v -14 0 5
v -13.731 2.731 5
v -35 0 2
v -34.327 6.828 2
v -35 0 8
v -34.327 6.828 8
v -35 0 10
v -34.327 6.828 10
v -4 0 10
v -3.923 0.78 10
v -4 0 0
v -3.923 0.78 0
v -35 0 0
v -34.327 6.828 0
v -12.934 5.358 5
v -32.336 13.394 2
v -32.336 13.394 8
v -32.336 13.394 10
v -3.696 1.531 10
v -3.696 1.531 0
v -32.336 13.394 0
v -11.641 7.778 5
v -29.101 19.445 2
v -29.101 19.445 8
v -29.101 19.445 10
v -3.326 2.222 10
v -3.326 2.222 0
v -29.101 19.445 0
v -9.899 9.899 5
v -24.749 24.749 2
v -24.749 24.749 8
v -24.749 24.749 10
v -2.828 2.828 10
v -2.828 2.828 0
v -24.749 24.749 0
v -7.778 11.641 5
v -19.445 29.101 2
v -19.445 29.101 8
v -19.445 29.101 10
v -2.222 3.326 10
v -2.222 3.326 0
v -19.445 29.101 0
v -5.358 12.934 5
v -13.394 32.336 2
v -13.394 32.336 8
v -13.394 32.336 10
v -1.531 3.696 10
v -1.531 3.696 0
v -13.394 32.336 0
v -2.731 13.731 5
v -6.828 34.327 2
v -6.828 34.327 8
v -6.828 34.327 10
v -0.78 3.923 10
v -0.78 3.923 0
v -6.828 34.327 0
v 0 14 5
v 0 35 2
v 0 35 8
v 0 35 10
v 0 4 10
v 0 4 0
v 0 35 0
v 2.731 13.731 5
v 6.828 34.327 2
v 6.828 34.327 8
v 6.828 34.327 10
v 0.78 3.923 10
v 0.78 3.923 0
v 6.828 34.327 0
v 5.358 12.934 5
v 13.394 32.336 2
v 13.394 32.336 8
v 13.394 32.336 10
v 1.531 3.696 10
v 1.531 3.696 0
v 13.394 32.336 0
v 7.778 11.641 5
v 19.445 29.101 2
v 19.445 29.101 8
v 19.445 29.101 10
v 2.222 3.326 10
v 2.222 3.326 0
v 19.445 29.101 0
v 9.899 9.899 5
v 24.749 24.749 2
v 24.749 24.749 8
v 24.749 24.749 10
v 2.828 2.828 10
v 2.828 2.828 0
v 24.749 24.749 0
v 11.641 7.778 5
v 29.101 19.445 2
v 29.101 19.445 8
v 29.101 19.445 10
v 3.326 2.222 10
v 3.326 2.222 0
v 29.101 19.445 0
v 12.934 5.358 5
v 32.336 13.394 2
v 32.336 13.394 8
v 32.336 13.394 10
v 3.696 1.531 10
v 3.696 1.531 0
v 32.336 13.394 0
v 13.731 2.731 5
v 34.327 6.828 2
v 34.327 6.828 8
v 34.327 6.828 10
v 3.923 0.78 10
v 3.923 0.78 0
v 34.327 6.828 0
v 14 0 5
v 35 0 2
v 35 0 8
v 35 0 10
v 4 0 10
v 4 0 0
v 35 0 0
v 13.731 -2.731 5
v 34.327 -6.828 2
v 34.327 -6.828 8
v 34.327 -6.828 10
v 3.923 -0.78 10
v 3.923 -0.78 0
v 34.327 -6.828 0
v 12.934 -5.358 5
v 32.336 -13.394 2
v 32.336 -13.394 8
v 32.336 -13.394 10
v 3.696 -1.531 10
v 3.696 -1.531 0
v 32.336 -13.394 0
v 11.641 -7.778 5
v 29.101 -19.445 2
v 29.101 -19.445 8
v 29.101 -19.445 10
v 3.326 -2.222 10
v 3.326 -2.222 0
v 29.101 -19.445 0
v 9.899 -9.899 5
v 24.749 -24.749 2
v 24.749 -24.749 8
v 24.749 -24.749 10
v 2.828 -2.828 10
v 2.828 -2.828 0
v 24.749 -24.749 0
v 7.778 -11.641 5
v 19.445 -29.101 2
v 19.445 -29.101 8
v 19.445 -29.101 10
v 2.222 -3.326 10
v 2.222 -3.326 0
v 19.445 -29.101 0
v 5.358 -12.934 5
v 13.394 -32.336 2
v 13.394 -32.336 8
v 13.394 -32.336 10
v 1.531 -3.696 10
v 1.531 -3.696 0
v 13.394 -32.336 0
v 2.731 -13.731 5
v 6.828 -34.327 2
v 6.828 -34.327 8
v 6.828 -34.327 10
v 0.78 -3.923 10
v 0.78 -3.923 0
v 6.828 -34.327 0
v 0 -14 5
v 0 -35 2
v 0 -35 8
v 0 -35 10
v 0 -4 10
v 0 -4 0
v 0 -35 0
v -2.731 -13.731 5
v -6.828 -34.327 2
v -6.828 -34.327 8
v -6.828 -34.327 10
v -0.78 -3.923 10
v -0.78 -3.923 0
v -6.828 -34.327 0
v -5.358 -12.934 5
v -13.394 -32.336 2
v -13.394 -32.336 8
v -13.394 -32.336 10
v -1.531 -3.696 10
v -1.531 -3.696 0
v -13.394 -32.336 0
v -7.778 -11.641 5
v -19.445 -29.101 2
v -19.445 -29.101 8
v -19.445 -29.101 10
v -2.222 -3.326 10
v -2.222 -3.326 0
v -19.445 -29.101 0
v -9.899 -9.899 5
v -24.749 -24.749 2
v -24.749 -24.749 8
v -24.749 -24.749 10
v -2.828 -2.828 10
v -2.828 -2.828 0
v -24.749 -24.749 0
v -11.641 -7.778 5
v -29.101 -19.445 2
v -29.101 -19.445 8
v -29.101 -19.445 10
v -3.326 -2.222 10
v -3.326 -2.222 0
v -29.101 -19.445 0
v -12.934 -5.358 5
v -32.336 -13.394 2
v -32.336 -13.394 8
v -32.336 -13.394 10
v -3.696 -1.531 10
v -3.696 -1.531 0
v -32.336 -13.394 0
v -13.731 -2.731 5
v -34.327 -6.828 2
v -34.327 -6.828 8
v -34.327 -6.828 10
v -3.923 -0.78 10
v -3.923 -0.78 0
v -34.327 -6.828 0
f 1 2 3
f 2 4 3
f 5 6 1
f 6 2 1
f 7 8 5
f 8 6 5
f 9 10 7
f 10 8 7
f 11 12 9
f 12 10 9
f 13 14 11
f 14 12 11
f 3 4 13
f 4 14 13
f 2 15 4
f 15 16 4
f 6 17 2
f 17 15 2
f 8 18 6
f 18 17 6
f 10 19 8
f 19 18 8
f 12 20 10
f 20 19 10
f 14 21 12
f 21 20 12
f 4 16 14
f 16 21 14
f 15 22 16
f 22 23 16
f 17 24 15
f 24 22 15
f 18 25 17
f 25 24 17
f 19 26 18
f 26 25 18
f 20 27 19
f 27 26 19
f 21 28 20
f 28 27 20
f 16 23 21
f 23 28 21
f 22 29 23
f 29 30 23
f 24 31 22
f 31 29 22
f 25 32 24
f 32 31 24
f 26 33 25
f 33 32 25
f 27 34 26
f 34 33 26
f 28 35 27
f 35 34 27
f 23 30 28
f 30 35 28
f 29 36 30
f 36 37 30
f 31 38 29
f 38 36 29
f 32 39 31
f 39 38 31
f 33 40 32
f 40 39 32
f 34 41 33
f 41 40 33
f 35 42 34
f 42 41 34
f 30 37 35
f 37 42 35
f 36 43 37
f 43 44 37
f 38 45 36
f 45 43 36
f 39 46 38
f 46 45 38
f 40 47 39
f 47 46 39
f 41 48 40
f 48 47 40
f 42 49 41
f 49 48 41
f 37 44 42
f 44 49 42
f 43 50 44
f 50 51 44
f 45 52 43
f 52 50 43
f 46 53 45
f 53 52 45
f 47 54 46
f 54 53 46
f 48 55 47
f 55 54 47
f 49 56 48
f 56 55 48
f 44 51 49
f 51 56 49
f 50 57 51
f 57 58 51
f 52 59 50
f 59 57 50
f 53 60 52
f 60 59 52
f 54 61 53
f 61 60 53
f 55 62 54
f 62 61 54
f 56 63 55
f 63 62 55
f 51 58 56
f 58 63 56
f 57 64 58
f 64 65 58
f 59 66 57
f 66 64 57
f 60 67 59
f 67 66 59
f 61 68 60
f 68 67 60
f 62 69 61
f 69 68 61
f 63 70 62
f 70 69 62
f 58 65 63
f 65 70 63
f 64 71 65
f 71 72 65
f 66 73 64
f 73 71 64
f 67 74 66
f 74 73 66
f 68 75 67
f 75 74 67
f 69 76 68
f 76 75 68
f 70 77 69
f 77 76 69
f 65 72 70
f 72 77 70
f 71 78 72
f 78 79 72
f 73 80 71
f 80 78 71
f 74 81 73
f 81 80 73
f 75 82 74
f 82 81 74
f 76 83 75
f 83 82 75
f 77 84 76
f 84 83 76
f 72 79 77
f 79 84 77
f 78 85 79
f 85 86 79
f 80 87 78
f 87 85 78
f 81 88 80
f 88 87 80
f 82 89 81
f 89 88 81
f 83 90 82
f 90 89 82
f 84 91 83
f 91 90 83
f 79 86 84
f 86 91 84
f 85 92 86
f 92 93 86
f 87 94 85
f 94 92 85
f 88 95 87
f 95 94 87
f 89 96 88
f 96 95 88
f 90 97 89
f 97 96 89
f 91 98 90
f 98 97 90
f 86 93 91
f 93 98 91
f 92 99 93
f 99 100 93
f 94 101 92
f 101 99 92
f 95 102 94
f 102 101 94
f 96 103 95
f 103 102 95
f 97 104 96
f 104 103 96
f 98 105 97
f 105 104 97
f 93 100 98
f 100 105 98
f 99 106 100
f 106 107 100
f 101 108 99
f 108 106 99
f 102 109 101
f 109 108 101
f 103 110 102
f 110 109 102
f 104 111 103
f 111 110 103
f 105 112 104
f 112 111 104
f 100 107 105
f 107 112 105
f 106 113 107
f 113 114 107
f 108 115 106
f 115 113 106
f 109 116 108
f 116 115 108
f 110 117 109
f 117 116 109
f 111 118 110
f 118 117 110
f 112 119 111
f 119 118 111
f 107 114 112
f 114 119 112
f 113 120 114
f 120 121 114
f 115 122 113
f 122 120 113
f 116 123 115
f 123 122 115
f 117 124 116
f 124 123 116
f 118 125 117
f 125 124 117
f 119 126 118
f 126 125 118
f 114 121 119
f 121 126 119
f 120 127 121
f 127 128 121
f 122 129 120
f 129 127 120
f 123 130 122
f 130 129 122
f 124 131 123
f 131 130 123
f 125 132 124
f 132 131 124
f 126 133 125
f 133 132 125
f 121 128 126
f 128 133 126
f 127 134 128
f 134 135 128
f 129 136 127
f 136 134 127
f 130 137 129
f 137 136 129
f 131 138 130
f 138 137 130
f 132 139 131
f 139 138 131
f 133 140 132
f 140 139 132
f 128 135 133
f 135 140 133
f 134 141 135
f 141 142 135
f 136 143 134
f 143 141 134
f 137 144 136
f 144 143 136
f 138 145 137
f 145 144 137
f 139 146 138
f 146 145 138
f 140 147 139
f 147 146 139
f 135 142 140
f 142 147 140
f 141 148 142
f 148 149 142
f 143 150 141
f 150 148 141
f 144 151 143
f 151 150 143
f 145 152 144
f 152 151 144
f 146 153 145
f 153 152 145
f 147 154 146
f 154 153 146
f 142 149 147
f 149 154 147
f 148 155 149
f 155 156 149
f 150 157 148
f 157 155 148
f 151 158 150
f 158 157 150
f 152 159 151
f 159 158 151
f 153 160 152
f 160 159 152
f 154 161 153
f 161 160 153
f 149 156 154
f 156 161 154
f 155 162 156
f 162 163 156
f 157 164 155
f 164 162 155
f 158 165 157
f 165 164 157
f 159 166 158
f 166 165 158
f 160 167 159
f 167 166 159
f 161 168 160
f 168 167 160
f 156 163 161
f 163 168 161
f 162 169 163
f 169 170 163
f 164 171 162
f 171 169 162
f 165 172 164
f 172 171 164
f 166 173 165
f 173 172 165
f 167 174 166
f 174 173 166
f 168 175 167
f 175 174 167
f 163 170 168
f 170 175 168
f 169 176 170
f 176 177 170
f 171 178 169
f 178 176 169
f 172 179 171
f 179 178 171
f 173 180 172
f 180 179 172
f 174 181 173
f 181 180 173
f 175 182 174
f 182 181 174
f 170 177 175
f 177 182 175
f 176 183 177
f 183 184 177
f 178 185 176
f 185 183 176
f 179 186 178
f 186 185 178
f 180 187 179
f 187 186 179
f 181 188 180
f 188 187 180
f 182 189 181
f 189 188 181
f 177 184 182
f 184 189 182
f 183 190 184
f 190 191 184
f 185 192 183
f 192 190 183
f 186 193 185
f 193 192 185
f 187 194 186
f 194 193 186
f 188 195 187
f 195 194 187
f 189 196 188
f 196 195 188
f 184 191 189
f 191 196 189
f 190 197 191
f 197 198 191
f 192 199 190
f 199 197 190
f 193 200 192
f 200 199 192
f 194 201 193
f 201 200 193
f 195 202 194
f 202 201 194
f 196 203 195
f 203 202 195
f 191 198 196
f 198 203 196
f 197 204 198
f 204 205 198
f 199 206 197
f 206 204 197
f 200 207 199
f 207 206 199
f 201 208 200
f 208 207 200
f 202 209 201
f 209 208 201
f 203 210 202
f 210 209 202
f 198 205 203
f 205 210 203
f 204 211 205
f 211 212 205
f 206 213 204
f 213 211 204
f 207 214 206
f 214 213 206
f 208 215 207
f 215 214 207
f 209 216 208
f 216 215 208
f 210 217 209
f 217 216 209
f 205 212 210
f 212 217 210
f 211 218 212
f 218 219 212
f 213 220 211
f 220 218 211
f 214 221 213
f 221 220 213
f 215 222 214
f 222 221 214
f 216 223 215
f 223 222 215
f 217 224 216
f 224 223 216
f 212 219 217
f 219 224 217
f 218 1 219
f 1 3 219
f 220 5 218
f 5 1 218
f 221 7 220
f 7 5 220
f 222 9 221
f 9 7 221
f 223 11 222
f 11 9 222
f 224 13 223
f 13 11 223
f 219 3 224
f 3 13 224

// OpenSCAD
$fn = 32;

// ----------------------------------------------------------------------
// Revolved part: V-groove pulley R35
// ----------------------------------------------------------------------

// --- parameters (mm) ---
bore_r = 4;               // bore radius
rim_r = 35;               // rim radius
rim_t = 10;               // rim width
groove_r = 14;            // groove root radius
groove_w = 3;             // groove half width
revolve_angle = 360;      // revolve sweep, degrees

bore_d = 2 * bore_r;
rim_d = 2 * rim_r;
groove_d = 2 * groove_r;

profile = [[4, 0], [35, 0], [35, 2], [14, 5], [35, 8], [35, 10], [4, 10]];  // primary outline, 7 points, counter clockwise

// --- the one profile operation ---
rotate_extrude(angle = revolve_angle) polygon(points = profile);
